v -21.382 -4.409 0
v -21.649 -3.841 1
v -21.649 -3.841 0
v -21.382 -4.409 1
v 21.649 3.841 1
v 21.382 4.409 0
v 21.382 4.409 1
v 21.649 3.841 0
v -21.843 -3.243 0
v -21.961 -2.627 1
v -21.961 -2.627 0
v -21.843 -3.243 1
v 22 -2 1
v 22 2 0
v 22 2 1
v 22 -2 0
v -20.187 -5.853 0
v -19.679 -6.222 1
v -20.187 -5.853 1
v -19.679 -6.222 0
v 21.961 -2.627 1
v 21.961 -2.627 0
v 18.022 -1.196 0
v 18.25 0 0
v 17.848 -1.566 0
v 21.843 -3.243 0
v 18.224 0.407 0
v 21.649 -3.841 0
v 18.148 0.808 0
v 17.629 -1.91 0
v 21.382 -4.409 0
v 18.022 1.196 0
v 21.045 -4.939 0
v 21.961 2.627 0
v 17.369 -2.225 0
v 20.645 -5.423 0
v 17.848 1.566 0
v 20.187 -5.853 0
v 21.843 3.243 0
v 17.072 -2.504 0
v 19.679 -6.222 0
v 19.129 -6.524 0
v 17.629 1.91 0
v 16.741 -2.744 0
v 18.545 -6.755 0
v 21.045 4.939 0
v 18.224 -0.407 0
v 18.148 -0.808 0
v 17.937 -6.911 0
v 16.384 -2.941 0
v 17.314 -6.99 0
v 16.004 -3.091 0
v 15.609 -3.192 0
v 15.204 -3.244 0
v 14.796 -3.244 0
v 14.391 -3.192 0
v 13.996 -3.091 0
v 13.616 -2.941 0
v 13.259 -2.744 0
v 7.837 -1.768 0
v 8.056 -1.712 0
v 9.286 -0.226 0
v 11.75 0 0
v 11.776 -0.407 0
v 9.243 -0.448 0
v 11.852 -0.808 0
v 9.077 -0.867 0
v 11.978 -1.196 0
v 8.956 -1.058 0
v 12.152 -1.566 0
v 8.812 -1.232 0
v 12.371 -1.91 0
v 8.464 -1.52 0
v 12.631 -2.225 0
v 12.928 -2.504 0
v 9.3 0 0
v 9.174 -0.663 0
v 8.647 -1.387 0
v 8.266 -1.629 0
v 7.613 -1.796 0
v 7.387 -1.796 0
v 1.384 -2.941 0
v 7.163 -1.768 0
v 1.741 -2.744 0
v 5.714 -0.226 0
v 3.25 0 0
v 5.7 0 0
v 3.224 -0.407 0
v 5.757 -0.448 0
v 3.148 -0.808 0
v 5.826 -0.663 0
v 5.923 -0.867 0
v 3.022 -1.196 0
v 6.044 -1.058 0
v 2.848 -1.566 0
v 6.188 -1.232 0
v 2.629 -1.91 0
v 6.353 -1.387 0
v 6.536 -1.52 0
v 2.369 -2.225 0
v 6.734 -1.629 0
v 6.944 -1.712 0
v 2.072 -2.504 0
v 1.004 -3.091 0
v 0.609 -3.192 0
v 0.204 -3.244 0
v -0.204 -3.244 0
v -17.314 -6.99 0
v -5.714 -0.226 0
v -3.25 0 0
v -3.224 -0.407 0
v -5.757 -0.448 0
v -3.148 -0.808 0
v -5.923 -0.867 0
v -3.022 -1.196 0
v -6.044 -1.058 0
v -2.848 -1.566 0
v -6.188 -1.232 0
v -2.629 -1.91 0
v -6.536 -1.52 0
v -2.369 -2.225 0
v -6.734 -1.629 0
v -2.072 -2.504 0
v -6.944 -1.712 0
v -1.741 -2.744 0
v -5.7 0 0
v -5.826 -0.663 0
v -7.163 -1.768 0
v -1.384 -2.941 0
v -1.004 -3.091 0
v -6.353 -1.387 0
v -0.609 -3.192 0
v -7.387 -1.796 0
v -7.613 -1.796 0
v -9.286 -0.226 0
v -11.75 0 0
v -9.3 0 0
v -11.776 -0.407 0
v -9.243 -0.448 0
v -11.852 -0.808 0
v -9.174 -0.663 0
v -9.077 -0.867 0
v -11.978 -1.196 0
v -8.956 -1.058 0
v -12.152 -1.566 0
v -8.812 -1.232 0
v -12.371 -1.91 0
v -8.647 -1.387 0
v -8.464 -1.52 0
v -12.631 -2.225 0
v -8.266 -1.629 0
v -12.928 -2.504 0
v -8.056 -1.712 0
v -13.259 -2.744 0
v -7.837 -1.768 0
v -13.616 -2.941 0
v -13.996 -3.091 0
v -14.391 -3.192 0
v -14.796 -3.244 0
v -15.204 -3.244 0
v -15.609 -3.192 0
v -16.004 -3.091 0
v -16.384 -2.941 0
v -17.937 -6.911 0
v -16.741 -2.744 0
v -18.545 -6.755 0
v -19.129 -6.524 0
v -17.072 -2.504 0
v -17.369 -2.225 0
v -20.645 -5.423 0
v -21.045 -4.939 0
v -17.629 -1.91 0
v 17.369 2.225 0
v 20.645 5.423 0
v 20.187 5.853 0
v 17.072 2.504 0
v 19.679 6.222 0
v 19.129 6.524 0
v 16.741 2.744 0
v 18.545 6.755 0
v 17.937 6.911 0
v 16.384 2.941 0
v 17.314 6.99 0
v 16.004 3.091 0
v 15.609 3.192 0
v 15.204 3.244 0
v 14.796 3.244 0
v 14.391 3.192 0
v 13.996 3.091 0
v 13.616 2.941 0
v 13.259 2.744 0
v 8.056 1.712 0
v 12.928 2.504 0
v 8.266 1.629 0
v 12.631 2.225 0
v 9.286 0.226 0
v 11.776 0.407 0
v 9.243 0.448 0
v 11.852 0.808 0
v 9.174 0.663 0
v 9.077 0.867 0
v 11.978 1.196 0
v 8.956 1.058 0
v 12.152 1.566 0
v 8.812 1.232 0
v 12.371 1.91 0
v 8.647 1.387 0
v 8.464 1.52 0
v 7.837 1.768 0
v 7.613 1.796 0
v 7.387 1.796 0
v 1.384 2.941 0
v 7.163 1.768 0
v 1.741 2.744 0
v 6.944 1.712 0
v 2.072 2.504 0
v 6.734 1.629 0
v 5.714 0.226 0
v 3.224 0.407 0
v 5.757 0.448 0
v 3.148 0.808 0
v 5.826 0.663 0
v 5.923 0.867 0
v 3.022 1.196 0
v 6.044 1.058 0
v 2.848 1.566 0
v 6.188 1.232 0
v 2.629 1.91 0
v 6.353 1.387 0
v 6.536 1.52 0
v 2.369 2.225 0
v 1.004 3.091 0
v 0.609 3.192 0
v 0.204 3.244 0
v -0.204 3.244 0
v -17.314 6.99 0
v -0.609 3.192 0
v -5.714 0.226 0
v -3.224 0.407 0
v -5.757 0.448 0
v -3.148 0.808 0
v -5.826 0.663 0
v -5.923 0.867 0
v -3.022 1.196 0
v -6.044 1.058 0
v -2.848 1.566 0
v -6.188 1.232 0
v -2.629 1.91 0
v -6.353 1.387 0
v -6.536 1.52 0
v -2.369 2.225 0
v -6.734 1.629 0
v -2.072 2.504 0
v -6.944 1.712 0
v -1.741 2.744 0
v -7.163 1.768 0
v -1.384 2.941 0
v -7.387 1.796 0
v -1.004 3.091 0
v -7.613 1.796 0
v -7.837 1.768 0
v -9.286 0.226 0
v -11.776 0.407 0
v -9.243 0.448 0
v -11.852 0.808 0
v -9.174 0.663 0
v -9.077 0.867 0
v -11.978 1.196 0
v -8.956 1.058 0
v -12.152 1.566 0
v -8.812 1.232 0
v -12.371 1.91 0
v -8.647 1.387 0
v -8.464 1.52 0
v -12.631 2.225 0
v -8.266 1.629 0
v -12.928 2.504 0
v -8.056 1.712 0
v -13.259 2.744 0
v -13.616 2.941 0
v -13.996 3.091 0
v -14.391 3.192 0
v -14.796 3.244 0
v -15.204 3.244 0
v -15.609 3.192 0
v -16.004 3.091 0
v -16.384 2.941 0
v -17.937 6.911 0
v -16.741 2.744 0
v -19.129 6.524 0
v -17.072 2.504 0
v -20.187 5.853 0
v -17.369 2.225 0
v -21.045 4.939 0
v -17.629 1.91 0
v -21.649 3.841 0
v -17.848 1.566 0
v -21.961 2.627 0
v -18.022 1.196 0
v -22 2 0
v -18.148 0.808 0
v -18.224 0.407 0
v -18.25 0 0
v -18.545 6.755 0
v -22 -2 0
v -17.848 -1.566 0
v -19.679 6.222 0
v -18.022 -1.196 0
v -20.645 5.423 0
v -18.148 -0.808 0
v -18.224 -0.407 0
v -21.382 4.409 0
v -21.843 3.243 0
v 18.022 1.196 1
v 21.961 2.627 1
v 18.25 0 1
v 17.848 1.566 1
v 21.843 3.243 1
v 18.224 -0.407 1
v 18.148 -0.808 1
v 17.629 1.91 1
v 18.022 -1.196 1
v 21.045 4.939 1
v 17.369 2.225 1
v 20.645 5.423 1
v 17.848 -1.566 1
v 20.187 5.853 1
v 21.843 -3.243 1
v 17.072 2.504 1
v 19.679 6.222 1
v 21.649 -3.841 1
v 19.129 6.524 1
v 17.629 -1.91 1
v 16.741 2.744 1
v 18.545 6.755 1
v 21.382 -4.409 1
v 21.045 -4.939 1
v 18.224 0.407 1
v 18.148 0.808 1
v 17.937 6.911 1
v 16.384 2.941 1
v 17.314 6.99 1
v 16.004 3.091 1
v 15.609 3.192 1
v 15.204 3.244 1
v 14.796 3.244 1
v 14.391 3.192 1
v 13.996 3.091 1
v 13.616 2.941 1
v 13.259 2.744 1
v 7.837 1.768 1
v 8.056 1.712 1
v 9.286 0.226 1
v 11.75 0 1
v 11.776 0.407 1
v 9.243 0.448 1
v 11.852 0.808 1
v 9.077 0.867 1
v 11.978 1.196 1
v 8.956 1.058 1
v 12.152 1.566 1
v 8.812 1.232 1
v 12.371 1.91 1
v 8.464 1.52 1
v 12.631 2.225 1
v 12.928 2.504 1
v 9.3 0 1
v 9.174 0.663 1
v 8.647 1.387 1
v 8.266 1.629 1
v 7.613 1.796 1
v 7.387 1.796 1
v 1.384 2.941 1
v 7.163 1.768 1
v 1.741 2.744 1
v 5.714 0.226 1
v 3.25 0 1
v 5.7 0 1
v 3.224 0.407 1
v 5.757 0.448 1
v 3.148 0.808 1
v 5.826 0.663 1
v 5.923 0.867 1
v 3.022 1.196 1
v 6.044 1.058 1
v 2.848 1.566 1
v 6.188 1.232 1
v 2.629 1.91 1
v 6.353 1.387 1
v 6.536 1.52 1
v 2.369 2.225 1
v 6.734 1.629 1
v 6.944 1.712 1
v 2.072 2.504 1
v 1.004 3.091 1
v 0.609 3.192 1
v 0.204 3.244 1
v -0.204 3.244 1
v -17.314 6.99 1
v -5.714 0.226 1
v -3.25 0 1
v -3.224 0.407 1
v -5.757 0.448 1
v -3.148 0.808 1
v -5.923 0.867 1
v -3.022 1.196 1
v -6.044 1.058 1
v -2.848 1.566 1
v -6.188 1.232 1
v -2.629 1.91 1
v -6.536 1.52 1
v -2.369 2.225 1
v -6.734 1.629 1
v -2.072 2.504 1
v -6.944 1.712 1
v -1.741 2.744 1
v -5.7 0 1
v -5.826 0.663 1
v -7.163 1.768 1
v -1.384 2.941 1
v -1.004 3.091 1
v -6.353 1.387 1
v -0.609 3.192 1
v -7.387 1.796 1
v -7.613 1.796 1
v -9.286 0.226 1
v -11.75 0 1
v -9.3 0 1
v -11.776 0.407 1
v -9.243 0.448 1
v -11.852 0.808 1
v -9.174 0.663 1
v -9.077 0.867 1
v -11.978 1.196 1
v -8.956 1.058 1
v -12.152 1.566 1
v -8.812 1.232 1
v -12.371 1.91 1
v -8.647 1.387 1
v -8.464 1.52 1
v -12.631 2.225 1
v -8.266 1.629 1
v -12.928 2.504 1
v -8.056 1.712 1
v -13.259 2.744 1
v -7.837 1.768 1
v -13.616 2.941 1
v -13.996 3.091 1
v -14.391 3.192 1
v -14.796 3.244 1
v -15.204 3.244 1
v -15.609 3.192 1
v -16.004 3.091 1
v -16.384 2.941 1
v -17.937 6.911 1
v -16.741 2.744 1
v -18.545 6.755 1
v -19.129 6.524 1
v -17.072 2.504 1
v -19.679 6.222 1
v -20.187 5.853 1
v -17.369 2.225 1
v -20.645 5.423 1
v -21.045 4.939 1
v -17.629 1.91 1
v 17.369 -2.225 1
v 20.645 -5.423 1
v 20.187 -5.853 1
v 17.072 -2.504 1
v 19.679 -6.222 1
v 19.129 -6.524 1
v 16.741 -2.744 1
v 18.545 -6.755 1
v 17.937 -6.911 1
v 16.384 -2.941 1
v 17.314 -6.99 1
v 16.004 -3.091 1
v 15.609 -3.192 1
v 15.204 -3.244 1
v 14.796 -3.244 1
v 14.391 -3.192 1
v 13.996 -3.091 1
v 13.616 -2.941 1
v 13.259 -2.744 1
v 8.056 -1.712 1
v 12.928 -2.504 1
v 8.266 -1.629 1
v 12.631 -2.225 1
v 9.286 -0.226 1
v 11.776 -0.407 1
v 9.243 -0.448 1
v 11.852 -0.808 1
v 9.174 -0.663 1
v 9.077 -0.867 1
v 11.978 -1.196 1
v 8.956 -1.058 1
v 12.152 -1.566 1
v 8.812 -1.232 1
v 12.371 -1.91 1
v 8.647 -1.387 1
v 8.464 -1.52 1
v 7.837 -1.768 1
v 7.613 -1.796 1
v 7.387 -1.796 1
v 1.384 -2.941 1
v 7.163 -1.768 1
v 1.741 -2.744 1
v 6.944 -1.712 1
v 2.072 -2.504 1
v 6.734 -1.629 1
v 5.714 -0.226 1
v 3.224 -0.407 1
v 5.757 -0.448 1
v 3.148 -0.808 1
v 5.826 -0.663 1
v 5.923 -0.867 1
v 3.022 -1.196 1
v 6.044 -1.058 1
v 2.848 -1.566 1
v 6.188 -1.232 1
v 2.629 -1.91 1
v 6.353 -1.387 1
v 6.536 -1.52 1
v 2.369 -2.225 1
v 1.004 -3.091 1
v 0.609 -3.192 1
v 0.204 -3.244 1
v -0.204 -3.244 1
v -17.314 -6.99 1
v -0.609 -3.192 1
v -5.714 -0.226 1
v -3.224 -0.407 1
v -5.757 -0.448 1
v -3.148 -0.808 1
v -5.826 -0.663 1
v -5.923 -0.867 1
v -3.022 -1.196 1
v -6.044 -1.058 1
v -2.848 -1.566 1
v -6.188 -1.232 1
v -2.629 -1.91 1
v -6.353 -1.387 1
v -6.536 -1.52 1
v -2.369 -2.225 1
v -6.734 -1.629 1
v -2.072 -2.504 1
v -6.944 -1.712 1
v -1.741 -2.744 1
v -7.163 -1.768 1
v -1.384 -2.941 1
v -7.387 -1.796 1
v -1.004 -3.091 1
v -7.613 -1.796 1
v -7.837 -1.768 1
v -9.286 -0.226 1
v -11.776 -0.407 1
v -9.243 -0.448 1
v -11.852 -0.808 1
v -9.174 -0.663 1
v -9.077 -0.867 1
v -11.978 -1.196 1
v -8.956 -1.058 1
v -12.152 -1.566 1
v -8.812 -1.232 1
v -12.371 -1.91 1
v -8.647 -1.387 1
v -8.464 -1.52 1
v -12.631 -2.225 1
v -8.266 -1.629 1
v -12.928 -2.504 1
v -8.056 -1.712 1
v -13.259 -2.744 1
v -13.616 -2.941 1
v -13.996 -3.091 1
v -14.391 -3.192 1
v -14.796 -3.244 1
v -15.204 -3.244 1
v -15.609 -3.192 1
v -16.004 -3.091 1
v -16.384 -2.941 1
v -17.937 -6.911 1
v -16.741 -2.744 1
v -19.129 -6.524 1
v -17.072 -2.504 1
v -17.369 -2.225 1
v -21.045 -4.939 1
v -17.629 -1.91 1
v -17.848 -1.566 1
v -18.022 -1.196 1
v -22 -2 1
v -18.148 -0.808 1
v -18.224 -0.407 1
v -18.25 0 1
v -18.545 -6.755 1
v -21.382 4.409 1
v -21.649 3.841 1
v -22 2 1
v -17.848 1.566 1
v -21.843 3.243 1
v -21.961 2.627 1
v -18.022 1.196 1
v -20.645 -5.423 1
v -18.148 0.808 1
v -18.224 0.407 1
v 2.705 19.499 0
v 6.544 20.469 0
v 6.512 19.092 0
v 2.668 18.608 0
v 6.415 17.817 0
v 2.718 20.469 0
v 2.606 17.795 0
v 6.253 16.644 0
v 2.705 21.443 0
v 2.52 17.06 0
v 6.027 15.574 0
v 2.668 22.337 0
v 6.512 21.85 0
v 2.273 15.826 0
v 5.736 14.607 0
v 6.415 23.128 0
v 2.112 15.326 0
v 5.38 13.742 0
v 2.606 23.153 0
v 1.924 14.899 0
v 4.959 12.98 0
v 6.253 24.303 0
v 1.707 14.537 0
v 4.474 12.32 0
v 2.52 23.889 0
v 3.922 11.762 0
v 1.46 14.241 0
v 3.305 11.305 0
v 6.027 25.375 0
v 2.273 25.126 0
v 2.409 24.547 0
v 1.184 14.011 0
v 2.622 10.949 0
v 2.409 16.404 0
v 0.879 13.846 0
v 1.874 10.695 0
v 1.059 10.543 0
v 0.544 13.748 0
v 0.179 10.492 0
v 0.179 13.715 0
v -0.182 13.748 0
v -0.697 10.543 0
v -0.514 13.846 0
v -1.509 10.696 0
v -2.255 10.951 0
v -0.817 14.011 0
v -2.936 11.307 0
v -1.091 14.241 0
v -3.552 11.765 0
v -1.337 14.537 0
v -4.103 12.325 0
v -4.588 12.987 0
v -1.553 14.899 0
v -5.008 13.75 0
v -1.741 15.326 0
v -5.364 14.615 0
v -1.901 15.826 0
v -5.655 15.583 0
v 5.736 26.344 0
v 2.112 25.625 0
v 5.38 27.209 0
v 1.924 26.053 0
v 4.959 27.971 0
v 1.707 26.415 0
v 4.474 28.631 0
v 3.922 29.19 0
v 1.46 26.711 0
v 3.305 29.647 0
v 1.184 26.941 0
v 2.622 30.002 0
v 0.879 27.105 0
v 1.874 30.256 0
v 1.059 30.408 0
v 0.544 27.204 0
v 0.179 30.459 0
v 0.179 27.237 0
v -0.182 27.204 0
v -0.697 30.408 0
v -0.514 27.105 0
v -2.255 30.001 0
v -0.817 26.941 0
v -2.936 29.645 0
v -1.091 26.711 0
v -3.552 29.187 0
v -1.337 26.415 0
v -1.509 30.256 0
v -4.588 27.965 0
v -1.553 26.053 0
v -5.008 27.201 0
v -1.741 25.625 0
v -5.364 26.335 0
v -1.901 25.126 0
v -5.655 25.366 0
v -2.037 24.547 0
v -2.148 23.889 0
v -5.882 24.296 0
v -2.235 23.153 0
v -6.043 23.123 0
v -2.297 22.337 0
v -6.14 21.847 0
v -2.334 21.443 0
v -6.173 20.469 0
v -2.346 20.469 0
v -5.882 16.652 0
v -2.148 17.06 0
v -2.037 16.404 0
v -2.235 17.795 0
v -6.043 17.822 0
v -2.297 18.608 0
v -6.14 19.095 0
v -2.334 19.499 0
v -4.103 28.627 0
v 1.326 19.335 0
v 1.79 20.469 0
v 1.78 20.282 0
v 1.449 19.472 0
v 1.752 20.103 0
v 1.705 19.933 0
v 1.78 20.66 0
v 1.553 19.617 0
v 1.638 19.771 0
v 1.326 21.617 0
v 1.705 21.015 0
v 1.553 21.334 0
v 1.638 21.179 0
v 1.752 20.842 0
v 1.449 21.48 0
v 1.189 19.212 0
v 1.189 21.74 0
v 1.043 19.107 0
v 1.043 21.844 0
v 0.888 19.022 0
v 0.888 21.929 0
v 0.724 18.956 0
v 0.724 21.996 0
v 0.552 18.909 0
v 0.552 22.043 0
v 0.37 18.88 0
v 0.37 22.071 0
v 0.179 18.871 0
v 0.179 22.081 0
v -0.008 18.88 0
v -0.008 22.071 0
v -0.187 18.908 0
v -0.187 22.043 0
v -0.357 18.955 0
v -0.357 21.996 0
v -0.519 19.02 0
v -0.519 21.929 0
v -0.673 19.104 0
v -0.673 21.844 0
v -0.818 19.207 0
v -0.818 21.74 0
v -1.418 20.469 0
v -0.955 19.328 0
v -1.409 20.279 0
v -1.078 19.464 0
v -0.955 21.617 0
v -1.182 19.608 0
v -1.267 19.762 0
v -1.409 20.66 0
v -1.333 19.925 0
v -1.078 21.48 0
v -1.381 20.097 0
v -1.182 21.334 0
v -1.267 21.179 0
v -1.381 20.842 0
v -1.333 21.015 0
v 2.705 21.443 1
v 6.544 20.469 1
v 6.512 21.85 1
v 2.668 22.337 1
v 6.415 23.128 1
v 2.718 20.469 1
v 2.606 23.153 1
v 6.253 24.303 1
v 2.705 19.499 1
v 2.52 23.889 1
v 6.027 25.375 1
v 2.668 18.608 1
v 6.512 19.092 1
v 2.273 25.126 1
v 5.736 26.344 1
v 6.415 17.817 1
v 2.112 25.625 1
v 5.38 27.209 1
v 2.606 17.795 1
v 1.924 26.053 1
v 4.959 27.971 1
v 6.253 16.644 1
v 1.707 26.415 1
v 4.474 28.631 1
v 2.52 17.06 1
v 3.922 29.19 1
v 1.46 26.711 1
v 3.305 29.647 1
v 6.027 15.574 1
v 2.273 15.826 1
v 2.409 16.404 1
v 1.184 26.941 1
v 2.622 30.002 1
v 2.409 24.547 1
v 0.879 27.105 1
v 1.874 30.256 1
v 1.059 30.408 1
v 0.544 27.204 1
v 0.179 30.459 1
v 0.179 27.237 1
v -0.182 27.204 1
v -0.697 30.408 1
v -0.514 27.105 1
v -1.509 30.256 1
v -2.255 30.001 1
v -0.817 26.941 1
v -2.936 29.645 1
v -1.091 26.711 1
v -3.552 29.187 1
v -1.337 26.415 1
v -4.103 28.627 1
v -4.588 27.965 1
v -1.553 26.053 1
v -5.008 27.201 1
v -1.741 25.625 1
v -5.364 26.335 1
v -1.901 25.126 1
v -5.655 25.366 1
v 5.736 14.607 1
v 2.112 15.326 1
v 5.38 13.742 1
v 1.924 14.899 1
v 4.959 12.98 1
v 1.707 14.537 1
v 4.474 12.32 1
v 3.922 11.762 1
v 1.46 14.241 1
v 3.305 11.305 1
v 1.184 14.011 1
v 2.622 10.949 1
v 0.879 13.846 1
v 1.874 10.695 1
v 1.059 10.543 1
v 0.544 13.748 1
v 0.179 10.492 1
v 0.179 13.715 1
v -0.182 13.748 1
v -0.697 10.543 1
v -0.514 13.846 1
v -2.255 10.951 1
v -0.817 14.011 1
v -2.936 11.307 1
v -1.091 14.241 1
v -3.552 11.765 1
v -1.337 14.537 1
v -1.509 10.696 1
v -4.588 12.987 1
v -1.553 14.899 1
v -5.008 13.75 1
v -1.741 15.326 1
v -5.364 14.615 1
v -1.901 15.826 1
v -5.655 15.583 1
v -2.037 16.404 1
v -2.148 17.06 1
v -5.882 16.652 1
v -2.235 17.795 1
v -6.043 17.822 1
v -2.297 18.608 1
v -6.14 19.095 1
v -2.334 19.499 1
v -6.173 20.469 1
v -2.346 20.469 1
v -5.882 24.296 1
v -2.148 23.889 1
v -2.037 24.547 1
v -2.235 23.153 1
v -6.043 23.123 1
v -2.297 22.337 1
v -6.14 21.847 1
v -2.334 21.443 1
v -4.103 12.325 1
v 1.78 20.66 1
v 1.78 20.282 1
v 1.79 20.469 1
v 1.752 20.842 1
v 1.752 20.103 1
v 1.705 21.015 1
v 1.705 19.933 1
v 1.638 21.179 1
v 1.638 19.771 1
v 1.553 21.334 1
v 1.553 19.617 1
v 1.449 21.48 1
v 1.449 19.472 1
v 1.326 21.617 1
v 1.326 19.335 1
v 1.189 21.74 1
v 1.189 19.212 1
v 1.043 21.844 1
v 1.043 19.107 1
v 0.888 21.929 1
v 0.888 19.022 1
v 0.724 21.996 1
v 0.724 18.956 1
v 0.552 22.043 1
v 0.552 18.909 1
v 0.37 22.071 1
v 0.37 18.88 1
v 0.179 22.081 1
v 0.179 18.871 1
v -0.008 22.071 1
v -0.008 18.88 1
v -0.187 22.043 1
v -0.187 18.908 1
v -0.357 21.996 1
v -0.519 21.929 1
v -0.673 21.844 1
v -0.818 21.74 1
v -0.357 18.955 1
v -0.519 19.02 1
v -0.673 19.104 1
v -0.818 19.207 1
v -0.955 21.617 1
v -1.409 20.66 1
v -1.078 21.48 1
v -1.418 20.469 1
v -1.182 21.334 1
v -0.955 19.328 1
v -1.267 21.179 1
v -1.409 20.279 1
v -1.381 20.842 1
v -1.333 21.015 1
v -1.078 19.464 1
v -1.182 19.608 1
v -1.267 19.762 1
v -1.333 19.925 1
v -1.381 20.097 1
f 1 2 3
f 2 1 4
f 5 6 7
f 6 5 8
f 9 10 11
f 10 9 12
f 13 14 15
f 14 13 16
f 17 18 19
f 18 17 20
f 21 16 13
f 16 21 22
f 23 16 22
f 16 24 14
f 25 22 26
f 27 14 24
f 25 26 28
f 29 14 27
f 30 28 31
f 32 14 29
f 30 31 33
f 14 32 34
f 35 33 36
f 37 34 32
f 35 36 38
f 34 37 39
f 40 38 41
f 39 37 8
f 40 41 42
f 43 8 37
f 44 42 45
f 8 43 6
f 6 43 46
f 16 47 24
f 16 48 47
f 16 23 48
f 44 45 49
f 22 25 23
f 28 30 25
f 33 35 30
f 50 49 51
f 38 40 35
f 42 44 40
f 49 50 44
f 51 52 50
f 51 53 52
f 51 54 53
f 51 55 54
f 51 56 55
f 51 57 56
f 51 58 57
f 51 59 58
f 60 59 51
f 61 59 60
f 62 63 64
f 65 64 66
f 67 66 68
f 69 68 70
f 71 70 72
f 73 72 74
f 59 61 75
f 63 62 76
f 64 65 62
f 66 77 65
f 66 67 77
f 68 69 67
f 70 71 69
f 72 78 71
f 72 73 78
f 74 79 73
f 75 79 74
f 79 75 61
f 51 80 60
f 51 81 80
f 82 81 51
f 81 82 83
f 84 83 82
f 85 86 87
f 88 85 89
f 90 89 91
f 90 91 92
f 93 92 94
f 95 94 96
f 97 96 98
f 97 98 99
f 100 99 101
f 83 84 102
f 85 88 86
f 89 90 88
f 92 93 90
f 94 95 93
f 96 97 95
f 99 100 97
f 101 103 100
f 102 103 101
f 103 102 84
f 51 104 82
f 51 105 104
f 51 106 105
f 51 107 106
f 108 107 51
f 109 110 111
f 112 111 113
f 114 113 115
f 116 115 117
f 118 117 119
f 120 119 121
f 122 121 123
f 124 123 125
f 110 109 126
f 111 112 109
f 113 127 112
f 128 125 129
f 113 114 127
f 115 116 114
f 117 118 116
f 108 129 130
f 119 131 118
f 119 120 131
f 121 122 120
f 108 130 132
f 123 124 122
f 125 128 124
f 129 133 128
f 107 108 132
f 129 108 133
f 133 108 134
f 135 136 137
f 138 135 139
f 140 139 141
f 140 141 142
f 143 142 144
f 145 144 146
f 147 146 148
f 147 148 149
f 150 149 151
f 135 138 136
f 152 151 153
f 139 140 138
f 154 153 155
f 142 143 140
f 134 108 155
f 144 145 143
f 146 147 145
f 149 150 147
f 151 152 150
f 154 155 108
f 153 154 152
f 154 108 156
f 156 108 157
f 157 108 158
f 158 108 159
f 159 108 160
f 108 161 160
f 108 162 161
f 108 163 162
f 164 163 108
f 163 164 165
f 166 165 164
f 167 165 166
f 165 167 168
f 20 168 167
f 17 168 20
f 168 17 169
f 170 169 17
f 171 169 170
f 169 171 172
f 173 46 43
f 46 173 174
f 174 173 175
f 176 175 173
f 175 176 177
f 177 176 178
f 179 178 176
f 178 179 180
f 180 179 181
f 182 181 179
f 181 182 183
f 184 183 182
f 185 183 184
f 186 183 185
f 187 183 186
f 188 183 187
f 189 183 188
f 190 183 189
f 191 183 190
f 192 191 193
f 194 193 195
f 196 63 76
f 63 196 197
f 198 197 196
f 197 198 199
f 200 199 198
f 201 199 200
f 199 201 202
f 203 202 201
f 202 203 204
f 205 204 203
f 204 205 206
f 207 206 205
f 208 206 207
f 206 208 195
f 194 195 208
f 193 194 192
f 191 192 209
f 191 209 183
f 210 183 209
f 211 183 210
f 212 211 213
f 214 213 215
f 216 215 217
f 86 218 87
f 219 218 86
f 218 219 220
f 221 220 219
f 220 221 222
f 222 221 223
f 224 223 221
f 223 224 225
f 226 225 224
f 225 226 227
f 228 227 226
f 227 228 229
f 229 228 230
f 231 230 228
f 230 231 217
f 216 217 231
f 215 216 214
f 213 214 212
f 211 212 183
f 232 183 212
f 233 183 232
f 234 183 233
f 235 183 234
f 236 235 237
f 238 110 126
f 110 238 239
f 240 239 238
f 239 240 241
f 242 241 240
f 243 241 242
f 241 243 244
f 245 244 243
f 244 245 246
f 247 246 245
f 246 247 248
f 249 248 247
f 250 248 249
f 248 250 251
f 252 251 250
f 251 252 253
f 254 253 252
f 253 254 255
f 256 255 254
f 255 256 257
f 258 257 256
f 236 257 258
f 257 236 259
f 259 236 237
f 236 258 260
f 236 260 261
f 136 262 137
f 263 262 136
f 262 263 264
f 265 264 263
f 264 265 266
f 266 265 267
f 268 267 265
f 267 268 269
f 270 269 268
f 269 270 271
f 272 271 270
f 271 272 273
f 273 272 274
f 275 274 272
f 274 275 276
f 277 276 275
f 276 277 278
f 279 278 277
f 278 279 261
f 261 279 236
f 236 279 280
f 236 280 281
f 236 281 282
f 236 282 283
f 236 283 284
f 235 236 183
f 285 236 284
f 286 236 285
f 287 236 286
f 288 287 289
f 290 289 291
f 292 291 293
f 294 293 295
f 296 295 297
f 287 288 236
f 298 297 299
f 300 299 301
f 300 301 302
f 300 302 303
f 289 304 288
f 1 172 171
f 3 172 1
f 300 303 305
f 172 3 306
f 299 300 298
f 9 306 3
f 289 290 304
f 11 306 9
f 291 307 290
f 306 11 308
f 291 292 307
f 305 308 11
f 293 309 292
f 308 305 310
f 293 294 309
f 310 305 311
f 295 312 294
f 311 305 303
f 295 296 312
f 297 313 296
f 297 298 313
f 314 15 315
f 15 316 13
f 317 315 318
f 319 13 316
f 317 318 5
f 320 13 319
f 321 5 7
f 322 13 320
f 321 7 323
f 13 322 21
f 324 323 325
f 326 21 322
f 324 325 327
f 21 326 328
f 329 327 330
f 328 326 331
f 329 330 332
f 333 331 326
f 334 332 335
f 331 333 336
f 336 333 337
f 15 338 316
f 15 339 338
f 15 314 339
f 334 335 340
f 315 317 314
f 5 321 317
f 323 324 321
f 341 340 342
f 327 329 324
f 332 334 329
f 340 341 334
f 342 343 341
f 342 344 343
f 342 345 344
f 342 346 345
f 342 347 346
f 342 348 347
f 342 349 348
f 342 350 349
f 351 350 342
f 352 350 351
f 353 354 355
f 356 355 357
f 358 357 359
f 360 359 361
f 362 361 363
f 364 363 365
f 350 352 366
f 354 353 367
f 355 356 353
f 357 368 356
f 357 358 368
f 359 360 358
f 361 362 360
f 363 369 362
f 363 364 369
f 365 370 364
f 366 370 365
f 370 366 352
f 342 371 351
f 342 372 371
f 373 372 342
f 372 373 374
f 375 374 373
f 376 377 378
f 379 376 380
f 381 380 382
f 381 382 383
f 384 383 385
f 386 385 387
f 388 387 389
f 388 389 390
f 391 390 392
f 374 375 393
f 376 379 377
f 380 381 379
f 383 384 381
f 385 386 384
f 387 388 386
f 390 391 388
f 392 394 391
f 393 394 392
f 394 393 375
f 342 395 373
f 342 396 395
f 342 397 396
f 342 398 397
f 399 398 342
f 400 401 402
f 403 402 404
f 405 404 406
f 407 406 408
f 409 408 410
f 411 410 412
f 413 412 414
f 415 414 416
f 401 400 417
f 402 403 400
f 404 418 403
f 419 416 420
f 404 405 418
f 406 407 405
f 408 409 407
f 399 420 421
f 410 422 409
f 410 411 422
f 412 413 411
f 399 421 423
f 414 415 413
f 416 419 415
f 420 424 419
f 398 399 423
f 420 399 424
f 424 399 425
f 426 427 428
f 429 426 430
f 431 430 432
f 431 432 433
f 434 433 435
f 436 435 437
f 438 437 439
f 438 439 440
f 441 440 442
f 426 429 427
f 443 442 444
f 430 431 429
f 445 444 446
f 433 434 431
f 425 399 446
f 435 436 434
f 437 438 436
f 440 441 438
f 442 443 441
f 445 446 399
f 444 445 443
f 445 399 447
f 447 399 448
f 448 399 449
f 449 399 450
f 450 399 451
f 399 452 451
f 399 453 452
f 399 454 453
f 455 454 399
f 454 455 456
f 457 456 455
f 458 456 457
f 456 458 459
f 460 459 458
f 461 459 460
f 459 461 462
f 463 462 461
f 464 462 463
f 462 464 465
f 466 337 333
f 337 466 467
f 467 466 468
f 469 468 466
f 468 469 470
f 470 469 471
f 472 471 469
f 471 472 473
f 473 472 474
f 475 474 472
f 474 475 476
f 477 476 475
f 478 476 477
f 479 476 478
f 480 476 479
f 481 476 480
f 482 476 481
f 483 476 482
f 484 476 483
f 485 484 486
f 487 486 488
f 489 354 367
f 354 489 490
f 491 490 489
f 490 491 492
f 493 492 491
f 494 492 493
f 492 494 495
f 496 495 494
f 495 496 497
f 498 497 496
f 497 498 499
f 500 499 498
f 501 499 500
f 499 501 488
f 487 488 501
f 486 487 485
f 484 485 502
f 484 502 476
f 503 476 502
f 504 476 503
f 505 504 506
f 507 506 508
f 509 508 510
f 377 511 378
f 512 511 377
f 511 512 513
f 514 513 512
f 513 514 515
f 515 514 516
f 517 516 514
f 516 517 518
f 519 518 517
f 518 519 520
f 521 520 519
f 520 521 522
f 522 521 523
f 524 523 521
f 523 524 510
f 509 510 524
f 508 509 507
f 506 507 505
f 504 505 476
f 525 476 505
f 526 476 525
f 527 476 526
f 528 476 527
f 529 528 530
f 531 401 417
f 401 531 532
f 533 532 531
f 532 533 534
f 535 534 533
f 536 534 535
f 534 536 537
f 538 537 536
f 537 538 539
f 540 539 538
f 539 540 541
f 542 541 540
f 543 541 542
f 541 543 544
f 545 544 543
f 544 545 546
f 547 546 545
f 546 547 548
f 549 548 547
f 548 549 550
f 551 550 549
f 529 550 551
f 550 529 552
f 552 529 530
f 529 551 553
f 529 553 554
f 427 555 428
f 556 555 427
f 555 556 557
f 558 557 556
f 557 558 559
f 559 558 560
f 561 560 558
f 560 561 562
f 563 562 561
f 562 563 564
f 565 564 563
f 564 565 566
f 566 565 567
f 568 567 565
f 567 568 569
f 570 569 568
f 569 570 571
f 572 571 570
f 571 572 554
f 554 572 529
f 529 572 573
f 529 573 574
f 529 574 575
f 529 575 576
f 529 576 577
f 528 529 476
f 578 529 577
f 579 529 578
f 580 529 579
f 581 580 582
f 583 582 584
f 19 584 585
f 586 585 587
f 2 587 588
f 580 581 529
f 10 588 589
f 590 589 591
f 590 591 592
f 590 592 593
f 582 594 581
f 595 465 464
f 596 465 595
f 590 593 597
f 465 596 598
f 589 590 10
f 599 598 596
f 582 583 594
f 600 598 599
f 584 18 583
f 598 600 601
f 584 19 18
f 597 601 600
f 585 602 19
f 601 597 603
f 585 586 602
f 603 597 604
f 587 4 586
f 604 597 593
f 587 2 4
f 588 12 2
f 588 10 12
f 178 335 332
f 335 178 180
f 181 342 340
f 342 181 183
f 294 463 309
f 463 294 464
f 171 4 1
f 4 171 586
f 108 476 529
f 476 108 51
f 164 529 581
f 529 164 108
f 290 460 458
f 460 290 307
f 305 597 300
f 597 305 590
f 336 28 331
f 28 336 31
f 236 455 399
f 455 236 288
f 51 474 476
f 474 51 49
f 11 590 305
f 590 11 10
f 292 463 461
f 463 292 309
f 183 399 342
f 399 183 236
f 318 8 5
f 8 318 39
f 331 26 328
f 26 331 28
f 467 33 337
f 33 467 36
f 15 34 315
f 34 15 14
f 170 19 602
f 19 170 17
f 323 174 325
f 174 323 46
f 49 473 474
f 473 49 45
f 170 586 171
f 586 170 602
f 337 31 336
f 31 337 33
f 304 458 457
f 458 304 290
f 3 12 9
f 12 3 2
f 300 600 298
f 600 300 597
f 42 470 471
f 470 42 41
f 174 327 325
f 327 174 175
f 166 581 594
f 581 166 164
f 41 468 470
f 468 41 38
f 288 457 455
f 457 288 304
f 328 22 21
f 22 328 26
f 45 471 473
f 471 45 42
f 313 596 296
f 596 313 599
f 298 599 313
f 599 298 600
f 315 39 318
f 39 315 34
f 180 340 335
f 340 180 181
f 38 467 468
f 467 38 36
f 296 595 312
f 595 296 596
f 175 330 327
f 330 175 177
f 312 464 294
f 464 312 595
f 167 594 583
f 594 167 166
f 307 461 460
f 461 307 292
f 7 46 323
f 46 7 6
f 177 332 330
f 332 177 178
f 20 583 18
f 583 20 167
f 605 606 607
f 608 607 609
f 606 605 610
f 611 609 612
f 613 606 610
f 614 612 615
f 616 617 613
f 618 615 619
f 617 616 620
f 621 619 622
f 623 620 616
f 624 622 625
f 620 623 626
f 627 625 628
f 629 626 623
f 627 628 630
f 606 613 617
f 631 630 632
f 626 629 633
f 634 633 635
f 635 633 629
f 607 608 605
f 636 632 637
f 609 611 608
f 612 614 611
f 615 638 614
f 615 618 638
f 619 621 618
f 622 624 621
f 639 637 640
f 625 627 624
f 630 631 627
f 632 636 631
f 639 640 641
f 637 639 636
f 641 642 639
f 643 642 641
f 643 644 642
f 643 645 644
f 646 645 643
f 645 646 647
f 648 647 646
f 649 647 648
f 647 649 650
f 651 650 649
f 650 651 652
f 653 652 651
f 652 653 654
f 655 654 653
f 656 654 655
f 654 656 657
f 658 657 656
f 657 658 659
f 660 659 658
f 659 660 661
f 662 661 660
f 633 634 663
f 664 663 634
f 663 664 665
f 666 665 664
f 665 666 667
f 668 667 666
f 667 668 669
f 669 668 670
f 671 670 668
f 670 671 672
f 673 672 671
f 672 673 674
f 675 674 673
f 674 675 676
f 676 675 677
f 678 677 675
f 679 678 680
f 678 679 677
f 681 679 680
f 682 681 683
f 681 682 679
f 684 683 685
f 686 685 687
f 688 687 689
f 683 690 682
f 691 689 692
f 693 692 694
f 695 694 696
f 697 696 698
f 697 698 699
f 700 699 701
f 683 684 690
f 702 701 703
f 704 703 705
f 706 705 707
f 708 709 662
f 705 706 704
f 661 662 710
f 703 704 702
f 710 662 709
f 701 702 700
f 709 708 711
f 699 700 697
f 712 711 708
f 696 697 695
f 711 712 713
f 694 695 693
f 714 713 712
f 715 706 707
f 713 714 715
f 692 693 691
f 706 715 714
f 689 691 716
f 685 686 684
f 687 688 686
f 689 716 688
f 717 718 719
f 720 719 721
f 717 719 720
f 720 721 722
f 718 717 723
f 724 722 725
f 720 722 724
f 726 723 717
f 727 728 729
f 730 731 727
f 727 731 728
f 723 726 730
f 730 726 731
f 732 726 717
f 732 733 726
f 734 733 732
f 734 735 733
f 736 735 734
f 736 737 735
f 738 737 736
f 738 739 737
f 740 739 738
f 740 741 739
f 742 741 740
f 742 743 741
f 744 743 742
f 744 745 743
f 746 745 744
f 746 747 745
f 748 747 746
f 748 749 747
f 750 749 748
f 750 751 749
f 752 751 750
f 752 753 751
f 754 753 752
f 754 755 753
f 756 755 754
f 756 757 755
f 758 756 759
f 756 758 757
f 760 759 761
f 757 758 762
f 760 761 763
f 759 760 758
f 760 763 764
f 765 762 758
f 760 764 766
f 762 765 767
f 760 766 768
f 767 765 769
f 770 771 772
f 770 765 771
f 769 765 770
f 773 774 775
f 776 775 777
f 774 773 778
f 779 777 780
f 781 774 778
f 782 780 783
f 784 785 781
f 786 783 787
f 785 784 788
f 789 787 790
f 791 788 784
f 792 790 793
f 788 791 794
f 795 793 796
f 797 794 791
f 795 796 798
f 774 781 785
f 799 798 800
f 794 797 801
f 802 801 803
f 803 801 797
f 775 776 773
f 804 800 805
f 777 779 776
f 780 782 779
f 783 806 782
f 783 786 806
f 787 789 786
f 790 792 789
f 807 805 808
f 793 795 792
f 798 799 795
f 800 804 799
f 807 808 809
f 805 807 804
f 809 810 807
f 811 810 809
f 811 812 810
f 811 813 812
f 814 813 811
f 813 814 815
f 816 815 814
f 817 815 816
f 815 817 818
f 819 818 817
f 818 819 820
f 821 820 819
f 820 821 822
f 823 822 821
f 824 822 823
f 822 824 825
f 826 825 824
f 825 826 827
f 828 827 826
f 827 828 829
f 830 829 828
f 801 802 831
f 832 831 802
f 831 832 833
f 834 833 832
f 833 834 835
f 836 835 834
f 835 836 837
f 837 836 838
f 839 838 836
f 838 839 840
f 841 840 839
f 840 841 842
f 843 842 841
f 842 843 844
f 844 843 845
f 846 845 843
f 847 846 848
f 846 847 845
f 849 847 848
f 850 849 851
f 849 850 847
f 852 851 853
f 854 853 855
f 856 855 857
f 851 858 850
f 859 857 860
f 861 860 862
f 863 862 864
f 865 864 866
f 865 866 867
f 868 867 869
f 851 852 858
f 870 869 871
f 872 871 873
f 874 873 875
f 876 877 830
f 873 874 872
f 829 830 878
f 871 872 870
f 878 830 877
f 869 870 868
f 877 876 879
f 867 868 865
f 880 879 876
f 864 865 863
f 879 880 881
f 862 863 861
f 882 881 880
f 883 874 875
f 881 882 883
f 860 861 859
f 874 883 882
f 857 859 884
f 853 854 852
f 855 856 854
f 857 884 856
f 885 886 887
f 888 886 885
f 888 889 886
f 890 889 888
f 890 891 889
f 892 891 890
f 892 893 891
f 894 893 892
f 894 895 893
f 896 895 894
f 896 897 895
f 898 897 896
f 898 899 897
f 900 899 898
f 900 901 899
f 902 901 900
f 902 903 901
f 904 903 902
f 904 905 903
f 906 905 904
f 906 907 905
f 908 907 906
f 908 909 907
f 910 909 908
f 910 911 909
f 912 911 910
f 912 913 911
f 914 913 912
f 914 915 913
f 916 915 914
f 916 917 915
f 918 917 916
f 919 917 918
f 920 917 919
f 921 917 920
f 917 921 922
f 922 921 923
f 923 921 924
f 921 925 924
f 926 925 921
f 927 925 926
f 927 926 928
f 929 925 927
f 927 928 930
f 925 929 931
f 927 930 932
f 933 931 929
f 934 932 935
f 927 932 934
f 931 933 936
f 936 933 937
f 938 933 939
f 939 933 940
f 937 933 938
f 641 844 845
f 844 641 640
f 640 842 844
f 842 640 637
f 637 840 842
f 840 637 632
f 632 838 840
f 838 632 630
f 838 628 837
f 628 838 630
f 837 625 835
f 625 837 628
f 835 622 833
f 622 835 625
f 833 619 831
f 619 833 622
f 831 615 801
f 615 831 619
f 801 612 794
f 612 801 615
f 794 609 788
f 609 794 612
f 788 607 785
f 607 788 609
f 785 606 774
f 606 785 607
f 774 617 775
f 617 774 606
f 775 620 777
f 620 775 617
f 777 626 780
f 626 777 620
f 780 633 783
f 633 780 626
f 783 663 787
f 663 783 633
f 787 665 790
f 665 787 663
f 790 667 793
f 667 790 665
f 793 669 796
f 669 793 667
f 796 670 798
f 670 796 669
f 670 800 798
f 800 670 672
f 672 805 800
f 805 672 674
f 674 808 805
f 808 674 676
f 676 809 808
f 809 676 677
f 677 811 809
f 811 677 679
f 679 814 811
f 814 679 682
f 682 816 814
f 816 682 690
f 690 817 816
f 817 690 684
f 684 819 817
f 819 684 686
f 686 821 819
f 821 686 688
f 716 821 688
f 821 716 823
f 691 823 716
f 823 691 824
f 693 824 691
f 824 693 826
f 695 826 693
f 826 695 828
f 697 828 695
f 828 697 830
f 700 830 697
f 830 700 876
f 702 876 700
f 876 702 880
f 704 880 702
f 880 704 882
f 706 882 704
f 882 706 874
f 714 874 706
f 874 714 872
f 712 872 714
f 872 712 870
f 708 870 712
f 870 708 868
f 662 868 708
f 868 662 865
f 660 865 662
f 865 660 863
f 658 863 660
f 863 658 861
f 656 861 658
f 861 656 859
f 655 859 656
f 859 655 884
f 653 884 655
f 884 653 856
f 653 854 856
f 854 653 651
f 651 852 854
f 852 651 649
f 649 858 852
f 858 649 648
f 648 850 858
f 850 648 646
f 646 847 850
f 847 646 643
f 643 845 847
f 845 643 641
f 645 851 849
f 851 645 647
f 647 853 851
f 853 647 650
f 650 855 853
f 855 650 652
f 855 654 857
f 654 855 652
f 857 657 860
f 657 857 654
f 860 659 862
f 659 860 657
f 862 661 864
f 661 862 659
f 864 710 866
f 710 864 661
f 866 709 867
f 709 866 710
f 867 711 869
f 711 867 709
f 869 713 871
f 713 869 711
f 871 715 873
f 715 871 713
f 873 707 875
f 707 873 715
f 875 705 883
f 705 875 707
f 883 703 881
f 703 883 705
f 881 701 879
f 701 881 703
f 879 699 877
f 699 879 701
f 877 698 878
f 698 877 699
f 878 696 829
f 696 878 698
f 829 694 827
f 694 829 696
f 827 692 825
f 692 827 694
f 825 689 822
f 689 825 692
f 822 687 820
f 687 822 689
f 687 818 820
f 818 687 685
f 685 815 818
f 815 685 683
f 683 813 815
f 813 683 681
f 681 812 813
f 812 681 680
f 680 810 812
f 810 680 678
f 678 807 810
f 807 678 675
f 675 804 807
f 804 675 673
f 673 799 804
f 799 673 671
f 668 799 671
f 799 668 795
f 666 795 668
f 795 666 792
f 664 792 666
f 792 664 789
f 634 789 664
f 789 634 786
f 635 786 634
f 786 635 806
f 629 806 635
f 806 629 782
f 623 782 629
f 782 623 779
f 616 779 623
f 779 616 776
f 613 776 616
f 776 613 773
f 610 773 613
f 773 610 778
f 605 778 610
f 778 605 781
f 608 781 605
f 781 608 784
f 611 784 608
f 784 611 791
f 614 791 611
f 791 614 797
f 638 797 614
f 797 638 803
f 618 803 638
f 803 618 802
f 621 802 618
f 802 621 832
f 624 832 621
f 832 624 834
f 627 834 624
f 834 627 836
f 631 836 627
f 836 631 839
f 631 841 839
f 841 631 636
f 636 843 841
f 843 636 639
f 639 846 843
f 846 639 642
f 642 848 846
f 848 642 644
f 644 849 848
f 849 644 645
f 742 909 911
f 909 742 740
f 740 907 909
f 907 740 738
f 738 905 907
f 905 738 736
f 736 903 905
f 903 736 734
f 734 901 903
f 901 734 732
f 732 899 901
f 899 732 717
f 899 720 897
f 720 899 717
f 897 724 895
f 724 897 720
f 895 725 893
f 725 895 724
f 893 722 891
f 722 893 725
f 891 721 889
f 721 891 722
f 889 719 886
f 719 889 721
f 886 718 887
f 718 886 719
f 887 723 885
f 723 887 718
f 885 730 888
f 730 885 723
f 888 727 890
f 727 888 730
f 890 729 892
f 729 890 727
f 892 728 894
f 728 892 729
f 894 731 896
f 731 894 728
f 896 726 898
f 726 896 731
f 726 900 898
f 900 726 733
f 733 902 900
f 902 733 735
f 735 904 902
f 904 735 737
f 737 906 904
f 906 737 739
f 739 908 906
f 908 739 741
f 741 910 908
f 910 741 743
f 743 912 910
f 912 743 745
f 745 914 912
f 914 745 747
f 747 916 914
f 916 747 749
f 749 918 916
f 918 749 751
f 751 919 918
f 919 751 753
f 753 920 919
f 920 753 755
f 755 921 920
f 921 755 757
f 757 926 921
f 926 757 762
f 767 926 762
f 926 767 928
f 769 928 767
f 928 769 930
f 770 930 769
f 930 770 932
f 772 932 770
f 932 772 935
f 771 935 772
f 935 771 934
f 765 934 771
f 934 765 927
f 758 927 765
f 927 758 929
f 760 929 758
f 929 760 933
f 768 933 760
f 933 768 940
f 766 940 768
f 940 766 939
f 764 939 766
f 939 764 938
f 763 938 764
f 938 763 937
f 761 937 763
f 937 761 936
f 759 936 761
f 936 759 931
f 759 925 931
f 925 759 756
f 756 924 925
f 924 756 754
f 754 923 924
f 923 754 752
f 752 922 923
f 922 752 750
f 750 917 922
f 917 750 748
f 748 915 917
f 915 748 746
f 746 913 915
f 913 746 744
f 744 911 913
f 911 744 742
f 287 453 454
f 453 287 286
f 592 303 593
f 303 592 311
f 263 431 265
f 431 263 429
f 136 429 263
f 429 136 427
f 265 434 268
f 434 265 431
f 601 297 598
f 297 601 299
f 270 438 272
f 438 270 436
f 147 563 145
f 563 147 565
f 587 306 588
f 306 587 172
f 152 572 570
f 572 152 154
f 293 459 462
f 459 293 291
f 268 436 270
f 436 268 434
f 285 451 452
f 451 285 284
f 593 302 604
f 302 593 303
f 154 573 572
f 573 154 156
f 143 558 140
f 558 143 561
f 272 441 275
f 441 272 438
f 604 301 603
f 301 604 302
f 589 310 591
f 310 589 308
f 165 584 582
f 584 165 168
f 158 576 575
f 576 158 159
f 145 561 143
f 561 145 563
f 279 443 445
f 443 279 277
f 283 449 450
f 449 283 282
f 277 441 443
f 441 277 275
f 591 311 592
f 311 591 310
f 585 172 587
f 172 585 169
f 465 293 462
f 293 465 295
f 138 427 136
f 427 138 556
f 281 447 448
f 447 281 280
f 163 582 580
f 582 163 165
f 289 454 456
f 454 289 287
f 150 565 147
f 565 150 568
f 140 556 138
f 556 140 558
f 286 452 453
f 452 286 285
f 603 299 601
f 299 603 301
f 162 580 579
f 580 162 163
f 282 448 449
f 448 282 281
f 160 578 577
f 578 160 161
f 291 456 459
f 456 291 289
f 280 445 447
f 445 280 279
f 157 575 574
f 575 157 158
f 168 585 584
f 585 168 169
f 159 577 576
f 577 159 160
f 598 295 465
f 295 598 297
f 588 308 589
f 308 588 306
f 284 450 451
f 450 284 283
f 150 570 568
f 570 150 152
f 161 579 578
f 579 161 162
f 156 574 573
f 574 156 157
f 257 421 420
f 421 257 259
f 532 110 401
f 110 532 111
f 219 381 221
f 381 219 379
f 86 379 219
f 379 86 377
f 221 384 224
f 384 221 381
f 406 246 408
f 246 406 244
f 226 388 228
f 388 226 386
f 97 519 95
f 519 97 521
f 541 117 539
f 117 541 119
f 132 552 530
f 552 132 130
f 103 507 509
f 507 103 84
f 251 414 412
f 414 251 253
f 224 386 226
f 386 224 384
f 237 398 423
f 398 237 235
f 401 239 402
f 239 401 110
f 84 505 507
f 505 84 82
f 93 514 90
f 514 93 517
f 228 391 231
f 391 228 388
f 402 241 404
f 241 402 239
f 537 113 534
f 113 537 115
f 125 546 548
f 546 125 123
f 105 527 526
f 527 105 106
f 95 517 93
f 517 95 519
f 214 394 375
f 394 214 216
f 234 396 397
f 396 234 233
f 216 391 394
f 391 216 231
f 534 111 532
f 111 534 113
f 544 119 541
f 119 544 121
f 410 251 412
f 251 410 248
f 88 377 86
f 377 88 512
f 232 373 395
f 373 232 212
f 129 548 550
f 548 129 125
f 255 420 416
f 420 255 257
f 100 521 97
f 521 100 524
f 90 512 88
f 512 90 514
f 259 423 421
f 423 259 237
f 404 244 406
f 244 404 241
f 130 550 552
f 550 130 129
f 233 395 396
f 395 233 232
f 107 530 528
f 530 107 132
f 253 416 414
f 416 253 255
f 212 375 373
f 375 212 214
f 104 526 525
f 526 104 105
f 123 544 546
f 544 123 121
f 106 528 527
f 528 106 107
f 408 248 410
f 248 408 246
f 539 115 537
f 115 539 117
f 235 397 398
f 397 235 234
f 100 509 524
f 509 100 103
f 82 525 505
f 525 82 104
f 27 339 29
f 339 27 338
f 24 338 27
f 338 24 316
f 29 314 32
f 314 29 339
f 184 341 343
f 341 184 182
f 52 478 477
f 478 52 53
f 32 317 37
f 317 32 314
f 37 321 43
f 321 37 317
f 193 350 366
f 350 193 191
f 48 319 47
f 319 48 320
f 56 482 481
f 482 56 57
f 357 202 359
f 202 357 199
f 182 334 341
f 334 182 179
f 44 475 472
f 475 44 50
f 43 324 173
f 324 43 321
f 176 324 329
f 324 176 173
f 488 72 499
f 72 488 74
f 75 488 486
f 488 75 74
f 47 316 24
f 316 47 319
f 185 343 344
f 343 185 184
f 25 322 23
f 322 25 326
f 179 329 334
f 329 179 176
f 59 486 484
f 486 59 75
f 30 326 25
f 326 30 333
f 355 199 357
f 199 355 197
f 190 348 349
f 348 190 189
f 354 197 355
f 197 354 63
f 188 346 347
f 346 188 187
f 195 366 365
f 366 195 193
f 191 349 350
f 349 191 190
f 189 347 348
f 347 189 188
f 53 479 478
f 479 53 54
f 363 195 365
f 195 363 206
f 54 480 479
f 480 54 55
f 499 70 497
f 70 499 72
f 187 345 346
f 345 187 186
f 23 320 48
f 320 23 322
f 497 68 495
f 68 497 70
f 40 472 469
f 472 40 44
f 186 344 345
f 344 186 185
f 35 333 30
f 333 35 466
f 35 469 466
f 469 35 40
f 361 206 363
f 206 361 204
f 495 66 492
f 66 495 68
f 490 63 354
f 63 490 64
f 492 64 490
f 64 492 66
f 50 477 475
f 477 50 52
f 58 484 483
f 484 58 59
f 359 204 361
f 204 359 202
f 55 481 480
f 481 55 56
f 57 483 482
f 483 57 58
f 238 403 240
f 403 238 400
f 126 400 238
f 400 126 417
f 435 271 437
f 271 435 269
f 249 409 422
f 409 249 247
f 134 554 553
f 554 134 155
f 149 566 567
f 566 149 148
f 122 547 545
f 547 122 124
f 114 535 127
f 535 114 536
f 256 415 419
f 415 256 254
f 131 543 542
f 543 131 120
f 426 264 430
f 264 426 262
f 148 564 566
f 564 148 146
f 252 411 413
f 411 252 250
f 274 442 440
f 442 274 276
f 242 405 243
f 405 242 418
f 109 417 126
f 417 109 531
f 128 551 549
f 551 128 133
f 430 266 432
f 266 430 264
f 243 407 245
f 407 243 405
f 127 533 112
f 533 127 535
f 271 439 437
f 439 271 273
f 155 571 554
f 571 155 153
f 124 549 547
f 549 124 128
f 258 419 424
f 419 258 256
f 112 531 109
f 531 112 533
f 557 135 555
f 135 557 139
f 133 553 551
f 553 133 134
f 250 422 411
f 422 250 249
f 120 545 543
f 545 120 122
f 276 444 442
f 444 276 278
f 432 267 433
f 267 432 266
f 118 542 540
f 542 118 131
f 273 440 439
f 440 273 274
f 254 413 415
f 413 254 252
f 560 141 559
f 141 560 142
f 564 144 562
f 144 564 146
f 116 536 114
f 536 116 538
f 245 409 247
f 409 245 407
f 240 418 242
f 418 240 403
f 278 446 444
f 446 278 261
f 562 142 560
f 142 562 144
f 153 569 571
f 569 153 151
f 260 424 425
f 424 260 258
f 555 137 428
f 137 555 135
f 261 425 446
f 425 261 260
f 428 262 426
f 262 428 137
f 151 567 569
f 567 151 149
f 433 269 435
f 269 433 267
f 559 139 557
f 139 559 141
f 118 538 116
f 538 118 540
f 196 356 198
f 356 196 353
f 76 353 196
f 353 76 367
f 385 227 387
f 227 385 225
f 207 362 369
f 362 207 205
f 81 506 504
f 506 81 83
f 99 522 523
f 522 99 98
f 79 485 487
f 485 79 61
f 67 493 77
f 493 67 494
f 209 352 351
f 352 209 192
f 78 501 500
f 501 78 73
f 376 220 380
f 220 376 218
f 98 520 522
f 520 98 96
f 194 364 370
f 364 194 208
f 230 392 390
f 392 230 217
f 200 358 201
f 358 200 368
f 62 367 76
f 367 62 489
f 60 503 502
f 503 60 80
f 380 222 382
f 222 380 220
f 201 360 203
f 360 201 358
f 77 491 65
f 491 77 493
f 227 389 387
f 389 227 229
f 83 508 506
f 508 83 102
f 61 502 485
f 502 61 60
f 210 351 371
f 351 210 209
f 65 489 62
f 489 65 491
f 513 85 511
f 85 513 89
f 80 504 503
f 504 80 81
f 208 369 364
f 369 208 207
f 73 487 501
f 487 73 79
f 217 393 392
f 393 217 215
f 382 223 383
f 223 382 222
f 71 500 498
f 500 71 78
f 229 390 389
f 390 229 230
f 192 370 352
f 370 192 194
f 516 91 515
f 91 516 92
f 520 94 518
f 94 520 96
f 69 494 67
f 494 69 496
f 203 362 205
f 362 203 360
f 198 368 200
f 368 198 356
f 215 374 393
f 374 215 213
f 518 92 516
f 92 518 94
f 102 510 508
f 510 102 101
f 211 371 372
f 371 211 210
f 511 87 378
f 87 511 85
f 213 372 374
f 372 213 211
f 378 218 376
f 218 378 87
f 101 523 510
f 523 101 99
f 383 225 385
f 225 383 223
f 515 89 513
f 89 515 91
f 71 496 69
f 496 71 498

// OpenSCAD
$fn = 50;


difference() {
	union() {
		hull() {
			translate(v = [-17.0000000000, 2.0000000000, 0]) {
				cylinder(h = 1, r = 5);
			}
			translate(v = [17.0000000000, 2.0000000000, 0]) {
				cylinder(h = 1, r = 5);
			}
			translate(v = [-17.0000000000, -2.0000000000, 0]) {
				cylinder(h = 1, r = 5);
			}
			translate(v = [17.0000000000, -2.0000000000, 0]) {
				cylinder(h = 1, r = 5);
			}
		}
		translate(v = [0, 30.0000000000, 0]) {
			linear_extrude(height = 1) {
				text(font = "DejaVu Sans Mono:style=Bold", halign = "center", size = 19.0000000000, text = "0", valign = "top");
			}
		}
	}
	union() {
		translate(v = [-15.0000000000, 0.0000000000, 0]) {
			translate(v = [0, 0, -100]) {
				cylinder(h = 200, r = 3.2500000000);
			}
		}
		translate(v = [0, 0, -100]) {
			cylinder(h = 200, r = 3.2500000000);
		}
		translate(v = [15.0000000000, 0.0000000000, 0]) {
			translate(v = [0, 0, -100]) {
				cylinder(h = 200, r = 3.2500000000);
			}
		}
		translate(v = [-15.0000000000, 0.0000000000, 0]) {
			translate(v = [0, 0, -100]) {
				cylinder(h = 200, r = 1.8000000000);
			}
		}
		translate(v = [-7.5000000000, 0.0000000000, 0]) {
			translate(v = [0, 0, -100]) {
				cylinder(h = 200, r = 1.8000000000);
			}
		}
		translate(v = [0, 0, -100]) {
			cylinder(h = 200, r = 1.8000000000);
		}
		translate(v = [7.5000000000, 0.0000000000, 0]) {
			translate(v = [0, 0, -100]) {
				cylinder(h = 200, r = 1.8000000000);
			}
		}
		translate(v = [15.0000000000, 0.0000000000, 0]) {
			translate(v = [0, 0, -100]) {
				cylinder(h = 200, r = 1.8000000000);
			}
		}
	}
}
